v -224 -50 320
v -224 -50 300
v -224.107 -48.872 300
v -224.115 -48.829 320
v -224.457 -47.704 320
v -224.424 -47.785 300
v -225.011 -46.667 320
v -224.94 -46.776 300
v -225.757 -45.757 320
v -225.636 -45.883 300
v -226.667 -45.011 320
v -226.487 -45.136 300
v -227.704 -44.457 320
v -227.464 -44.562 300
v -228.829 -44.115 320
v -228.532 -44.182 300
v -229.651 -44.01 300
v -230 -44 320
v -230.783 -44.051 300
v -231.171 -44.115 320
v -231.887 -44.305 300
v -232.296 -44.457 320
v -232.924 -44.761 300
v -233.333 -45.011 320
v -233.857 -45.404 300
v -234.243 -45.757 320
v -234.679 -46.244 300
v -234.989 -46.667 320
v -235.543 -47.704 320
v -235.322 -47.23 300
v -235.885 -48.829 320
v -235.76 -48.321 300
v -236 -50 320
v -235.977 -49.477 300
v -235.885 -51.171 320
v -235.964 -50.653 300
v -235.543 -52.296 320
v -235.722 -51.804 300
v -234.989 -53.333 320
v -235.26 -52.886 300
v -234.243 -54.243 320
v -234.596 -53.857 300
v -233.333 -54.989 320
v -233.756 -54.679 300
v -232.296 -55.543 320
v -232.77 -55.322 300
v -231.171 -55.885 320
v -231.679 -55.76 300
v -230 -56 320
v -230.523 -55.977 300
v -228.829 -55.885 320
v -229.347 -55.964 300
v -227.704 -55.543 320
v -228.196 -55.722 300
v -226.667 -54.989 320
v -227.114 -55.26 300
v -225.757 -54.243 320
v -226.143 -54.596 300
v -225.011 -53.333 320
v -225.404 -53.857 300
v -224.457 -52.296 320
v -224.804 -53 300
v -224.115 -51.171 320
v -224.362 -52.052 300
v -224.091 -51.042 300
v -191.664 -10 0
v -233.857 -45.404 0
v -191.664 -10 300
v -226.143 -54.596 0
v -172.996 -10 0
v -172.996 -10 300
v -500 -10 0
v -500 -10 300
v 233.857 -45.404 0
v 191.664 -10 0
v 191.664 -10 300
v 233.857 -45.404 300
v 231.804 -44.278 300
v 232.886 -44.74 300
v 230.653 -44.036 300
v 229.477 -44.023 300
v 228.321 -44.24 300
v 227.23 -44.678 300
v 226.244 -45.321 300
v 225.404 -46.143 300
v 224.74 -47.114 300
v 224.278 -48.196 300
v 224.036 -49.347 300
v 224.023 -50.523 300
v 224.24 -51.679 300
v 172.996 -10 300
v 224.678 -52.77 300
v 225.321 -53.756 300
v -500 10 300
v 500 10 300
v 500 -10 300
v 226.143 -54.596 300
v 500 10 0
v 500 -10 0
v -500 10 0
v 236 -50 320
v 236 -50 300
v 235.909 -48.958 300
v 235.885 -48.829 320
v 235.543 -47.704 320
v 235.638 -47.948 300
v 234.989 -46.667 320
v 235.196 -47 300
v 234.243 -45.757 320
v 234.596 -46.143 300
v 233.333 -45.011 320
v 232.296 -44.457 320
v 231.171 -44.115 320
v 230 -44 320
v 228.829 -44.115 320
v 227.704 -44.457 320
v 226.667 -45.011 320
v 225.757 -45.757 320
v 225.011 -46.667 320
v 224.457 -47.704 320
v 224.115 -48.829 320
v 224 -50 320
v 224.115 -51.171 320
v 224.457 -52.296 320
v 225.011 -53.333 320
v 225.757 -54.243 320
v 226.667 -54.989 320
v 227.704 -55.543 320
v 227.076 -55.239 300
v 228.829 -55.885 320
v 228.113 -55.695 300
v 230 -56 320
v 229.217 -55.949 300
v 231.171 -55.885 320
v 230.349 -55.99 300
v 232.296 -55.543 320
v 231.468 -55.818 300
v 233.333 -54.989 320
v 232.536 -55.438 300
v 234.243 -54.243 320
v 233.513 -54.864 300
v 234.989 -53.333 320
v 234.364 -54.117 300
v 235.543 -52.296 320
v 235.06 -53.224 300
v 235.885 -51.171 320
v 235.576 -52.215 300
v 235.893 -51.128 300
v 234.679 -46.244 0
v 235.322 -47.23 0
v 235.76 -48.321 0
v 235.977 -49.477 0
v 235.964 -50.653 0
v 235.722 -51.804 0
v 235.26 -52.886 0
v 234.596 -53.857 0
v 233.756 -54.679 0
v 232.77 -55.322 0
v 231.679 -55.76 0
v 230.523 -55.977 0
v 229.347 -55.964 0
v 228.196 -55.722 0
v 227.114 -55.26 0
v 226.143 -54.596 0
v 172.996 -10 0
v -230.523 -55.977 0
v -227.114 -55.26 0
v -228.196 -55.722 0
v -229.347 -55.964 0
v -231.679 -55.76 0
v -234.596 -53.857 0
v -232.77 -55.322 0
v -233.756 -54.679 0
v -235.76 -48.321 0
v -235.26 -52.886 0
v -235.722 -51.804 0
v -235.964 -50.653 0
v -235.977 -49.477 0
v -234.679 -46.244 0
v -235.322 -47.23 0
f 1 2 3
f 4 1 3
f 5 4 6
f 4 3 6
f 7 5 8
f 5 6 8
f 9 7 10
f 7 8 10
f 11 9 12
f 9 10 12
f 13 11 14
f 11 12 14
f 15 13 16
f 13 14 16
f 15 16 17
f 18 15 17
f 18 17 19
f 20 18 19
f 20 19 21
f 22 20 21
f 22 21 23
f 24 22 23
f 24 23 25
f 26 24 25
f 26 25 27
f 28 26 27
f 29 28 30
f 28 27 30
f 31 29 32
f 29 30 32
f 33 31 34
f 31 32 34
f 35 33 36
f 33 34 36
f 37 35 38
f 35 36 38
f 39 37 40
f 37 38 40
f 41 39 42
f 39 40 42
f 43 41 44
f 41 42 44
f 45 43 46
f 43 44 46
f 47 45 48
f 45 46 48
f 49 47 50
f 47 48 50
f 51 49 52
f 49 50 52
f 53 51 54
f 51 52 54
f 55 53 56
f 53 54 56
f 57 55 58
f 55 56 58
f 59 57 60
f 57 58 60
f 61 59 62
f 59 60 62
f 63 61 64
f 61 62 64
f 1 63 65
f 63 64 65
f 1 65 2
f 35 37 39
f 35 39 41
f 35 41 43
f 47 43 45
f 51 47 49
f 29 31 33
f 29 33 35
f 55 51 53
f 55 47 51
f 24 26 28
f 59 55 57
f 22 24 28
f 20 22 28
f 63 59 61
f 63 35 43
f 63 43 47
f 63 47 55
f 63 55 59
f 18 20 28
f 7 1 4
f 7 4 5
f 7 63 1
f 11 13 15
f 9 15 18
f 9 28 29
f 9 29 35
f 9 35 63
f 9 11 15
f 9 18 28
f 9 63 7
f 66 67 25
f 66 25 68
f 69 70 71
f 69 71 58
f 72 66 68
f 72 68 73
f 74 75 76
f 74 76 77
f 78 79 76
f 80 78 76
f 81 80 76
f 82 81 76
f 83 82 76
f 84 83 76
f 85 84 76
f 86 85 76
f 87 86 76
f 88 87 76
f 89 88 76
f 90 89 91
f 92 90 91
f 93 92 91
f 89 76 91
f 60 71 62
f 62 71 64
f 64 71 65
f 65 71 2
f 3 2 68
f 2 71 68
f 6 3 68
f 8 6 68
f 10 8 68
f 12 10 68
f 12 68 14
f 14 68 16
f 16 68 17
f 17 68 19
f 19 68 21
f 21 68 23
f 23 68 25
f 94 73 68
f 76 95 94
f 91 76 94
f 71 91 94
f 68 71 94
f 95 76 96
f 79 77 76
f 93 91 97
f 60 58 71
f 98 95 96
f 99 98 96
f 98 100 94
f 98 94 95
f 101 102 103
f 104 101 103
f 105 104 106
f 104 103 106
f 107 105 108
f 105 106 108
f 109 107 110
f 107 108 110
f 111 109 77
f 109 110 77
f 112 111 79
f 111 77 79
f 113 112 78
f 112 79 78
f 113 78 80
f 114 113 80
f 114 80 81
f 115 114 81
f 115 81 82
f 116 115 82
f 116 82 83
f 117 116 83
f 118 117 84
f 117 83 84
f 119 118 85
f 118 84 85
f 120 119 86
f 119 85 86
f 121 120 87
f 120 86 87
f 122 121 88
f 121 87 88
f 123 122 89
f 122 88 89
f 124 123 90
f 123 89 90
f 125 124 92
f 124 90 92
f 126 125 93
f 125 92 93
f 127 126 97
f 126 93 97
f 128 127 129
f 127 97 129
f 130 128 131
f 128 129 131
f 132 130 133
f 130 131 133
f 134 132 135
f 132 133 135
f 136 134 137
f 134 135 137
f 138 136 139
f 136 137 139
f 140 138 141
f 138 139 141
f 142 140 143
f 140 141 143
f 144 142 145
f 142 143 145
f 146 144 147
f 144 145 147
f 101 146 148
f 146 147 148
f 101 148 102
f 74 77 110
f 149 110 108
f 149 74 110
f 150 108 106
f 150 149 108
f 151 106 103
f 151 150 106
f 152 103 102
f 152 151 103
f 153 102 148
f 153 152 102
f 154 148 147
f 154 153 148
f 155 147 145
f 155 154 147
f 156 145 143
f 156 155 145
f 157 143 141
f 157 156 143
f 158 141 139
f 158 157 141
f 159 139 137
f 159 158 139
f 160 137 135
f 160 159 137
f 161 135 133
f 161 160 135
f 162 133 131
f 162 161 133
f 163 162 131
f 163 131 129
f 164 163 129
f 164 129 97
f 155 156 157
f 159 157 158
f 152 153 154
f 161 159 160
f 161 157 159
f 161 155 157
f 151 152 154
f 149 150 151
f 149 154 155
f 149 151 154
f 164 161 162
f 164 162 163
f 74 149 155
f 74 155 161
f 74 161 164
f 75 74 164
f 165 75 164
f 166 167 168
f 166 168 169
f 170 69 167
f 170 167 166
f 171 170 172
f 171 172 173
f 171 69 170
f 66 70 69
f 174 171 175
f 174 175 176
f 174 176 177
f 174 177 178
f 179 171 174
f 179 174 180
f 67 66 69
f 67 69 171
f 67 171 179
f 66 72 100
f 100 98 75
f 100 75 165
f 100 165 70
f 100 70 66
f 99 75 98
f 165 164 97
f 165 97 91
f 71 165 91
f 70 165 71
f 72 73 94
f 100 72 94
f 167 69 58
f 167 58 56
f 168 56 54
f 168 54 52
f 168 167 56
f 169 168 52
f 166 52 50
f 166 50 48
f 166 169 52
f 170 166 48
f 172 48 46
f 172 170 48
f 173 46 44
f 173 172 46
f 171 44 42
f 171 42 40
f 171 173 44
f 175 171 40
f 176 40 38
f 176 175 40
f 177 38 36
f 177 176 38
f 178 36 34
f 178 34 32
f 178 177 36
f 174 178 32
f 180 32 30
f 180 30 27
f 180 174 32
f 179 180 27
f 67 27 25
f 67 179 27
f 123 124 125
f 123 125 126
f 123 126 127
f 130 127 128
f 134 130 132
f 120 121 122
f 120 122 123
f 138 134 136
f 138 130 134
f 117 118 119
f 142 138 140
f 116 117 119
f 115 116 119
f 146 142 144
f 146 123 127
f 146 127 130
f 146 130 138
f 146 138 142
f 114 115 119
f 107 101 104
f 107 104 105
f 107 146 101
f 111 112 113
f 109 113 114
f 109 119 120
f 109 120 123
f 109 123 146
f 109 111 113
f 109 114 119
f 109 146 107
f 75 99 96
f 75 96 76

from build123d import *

# Parameters (mm, degrees)
BOSS_EXTRUDE1_DEPTH = 300
SKETCH2_R           = 6
BOSS_EXTRUDE2_DEPTH = 20


with BuildPart() as part:
    # Sketch1 → Boss-Extrude1 (new body)
    with BuildSketch(Plane.XY):
        with BuildLine():
            Line((-233.856725658, -45.403733341), (-191.664199257, -10))
            Line((-191.664199257, -10), (-500, -10))
            Line((-500, -10), (-500, 10))
            Line((-500, 10), (500, 10))
            Line((500, 10), (500, -10))
            Line((500, -10), (191.664199257, -10))
            Line((191.664199257, -10), (233.856725658, -45.403733341))
            ThreePointArc((233.856725658, -45.403733341), (234.596266659, -53.856725658), (226.143274342, -54.596266659))
            Line((226.143274342, -54.596266659), (172.995513335, -10))
            Line((172.995513335, -10), (-172.995513335, -10))
            Line((-172.995513335, -10), (-226.143274342, -54.596266659))
            ThreePointArc((-226.143274342, -54.596266659), (-234.596266659, -53.856725658), (-233.856725658, -45.403733341))
        make_face()
    extrude(amount=BOSS_EXTRUDE1_DEPTH)

    # Sketch2 → Boss-Extrude2 (add)
    with BuildSketch(Plane.XY.offset(300)):
        with Locations((-230, -50)):
            Circle(SKETCH2_R)
        with Locations((230, -50)):
            Circle(SKETCH2_R)
    extrude(amount=BOSS_EXTRUDE2_DEPTH)


solid = part.part
